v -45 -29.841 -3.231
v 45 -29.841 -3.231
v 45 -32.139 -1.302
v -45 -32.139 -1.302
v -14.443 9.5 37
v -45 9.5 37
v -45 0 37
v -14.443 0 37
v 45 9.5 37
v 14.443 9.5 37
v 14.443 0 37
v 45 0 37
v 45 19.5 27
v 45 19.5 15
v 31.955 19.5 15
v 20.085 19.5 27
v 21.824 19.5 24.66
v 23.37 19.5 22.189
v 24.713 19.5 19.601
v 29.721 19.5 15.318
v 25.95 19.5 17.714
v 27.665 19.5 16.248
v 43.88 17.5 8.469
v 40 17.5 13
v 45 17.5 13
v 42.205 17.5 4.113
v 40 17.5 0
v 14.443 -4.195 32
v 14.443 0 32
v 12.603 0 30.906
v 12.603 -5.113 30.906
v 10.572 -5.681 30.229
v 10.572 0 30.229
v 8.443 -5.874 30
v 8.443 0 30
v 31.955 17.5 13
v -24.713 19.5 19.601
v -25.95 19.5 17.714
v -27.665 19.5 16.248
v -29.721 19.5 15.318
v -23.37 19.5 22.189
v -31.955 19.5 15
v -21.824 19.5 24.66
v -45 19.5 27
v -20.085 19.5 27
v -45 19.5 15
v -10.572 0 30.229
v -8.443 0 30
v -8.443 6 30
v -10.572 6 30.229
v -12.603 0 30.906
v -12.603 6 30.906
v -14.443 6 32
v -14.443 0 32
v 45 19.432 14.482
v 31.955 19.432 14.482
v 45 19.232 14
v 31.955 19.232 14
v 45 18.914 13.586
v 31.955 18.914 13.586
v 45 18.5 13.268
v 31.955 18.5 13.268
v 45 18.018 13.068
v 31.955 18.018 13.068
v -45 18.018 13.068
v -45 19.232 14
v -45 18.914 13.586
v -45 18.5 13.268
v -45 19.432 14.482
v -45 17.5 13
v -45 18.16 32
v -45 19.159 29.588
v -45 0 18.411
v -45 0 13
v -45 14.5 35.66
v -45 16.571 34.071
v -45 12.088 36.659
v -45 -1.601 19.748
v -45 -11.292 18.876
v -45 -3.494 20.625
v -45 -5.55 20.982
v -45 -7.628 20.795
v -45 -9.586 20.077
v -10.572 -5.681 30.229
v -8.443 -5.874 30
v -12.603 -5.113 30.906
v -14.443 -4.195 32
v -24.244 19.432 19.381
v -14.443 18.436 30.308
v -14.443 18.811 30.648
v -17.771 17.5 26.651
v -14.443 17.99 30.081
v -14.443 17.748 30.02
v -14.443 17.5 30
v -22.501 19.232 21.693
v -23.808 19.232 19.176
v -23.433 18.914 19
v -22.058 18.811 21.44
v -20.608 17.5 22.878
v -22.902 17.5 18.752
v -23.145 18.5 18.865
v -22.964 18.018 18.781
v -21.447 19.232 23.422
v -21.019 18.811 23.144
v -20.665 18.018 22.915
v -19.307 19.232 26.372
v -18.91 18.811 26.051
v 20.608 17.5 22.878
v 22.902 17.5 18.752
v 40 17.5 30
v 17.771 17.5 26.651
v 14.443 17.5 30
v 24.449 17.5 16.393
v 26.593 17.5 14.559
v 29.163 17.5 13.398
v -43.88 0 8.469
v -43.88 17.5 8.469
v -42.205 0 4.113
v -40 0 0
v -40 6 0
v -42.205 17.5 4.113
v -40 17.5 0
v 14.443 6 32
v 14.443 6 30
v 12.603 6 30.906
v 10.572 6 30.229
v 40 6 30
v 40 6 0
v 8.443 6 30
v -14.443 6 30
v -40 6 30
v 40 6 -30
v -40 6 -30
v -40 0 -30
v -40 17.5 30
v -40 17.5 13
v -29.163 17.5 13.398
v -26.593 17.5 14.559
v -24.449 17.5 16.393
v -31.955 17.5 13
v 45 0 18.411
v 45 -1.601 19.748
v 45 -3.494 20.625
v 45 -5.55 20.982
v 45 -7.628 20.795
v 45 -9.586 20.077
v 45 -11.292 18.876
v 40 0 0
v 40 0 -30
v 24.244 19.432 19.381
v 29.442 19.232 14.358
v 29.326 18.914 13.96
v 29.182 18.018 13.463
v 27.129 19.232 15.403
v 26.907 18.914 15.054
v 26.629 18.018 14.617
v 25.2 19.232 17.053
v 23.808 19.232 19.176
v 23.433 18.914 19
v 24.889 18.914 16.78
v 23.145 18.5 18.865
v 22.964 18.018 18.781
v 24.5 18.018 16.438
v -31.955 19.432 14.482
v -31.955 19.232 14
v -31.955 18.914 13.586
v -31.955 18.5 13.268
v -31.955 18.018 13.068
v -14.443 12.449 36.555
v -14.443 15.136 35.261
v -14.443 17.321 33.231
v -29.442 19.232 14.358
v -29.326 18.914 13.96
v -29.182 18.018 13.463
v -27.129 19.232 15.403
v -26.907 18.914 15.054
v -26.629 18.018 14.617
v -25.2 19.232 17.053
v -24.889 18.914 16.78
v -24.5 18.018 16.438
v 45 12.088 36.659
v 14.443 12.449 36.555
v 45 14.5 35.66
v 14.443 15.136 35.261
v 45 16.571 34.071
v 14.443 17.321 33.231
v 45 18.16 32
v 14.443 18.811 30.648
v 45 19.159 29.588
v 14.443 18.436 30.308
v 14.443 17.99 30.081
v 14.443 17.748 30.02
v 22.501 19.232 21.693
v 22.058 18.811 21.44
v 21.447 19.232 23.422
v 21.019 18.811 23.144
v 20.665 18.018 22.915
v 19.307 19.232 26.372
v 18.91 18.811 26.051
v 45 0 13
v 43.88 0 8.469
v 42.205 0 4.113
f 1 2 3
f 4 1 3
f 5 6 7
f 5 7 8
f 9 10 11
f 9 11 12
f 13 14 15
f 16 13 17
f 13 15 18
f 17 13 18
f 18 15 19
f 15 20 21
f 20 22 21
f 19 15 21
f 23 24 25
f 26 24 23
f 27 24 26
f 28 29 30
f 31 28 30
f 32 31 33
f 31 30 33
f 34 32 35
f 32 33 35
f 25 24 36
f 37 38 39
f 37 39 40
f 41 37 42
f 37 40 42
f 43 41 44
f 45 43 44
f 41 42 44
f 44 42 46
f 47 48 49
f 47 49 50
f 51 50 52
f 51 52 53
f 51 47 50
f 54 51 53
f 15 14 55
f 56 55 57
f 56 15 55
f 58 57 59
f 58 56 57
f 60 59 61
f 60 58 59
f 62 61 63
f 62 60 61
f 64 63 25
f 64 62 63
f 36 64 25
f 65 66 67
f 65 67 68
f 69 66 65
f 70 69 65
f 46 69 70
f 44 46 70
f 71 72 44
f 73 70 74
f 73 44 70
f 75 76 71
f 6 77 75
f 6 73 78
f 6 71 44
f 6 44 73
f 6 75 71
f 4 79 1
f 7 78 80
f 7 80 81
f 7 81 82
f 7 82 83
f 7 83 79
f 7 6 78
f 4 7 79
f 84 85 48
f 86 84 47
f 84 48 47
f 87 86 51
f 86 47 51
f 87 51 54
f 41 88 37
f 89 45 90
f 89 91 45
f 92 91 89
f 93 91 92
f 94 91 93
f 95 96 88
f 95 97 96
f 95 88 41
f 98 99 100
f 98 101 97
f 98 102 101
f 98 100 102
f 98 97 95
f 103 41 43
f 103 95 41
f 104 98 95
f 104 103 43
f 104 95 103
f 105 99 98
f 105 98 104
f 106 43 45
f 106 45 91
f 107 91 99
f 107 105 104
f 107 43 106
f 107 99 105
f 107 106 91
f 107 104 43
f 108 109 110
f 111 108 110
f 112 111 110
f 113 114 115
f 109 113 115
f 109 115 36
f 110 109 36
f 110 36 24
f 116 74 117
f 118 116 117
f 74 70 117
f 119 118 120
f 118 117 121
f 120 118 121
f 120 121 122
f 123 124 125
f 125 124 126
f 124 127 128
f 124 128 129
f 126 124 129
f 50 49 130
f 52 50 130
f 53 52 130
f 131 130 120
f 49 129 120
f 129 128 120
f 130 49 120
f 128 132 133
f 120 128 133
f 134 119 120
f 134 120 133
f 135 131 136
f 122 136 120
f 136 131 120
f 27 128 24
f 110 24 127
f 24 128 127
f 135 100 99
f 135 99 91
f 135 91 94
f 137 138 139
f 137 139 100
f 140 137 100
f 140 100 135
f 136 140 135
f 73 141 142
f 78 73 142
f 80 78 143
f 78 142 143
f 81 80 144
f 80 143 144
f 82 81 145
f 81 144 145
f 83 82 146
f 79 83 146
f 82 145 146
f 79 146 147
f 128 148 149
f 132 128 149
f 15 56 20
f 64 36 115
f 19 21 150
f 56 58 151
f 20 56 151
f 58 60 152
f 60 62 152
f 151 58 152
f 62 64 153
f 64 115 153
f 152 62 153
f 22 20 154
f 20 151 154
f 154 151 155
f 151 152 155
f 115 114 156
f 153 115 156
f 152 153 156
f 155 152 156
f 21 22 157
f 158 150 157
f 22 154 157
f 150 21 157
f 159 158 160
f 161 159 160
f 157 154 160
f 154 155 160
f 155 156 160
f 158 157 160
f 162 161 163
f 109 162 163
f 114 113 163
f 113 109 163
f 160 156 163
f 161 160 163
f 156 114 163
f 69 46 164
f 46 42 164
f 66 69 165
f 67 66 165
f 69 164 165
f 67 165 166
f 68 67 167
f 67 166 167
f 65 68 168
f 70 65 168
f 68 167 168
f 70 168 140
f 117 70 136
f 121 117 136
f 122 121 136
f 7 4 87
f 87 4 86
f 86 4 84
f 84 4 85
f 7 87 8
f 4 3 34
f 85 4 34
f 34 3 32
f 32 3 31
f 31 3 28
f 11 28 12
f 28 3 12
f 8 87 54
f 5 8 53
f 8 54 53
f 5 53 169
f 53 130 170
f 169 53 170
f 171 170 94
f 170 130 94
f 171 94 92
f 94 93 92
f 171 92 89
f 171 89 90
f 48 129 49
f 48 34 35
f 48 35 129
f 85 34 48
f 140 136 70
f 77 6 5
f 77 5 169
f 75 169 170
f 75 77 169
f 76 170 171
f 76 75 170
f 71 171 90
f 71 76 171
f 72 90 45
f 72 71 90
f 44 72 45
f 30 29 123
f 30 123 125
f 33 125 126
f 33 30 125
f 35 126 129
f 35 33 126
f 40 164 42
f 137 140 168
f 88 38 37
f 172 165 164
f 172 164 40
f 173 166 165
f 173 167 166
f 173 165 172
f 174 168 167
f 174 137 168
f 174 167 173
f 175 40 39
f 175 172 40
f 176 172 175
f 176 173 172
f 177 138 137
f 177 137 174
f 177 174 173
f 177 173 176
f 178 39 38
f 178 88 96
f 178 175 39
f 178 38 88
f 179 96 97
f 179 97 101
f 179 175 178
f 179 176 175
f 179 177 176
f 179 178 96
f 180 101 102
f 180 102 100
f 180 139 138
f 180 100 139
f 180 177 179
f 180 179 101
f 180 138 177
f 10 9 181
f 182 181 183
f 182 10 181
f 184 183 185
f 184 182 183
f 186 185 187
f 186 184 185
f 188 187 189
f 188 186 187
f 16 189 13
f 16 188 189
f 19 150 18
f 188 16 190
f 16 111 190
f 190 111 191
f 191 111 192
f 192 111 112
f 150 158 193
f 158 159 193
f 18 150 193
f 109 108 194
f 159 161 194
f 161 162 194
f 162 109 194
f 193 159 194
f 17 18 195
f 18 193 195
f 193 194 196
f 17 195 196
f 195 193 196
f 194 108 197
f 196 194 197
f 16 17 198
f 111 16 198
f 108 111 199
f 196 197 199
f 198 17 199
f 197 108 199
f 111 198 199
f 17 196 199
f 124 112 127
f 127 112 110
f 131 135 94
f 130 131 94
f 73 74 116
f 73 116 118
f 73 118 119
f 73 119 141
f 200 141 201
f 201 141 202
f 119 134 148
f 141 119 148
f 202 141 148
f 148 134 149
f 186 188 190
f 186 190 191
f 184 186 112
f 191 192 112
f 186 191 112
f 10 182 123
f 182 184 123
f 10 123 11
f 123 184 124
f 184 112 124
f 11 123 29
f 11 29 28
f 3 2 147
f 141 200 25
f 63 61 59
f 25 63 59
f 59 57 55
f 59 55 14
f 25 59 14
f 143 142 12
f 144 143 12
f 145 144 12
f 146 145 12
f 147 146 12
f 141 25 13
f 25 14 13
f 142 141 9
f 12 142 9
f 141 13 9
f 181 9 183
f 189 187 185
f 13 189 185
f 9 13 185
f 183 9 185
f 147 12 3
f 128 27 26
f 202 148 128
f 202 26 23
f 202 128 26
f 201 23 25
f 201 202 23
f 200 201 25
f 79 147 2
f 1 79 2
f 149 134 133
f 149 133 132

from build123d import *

# Parameters (mm, degrees)
SKETCH1_W           = 80
SKETCH1_H           = 60
BOSS_EXTRUDE1_DEPTH = 6
SKETCH2_W           = 5
SKETCH2_H           = 17
BOSS_EXTRUDE2_DEPTH = 11.5
BOSS_EXTRUDE3_DEPTH = 6
BOSS_EXTRUDE4_START = 6
BOSS_EXTRUDE4_DEPTH = 6
BOSS_EXTRUDE5_DEPTH = 2
SKETCH6_W           = 30.556561627
SKETCH6_H           = 19.5
BOSS_EXTRUDE6_DEPTH = 2
FILLET1_R           = 10
FILLET2_R           = 2
BOSS_EXTRUDE7_DEPTH = 5
BOSS_EXTRUDE8_DEPTH = 5
FILLET3_START       = -45
FILLET3_DEPTH       = 90
BOSS_EXTRUDE9_REACH = 101.243
CUT_EXTRUDE1_DEPTH  = 67.535252268


with BuildPart() as part:
    # Sketch1 → Boss-Extrude1 (new body)
    with BuildSketch(Plane(origin=(0, 0, 0), x_dir=(1, 0, 0), z_dir=(0, 1, 0))):
        Rectangle(SKETCH1_W, SKETCH1_H)
    extrude(amount=BOSS_EXTRUDE1_DEPTH)



with BuildPart() as body_2:
    # Sketch2 → Boss-Extrude2 (new body)
    with BuildSketch(Plane(origin=(0, 6, 0), x_dir=(1, 0, 0), z_dir=(0, 1, 0))):
        with BuildLine():
            Line((-45, -13), (-40, -13))
            Line((-40, -13), (-40, 0))
            ThreePointArc((-40, 0), (-43.110841292, -6.265061041), (-45, -13))
        make_face()
        with Locations((-42.5, -21.5)):
            Rectangle(SKETCH2_W, SKETCH2_H)
        with BuildLine():
            Line((40, 0), (40, -13))
            Line((40, -13), (45, -13))
            ThreePointArc((45, -13), (43.110841292, -6.265061041), (40, 0))
        make_face()
        with Locations((42.5, -21.5)):
            Rectangle(SKETCH2_W, SKETCH2_H)
    extrude(amount=BOSS_EXTRUDE2_DEPTH)


with BuildPart() as part_1:
    add(part.part)

    add(body_2.part)  # Boss-Extrude3 merges body 2
    # Sketch3 → Boss-Extrude3 (add)
    with BuildSketch(Plane.XZ.offset(-6)):
        with BuildLine():
            Line((-40, 0), (-40, 30))
            Line((-40, 30), (-45, 30))
            Line((-45, 30), (-45, 13))
            ThreePointArc((-45, 13), (-43.110841292, 6.265061041), (-40, 0))
        make_face()
    extrude(amount=BOSS_EXTRUDE3_DEPTH)

    # Sketch4 → Boss-Extrude4 (add)
    with BuildSketch(Plane.XZ.offset(-6).offset(BOSS_EXTRUDE4_START)):
        with BuildLine():
            Line((40, 30), (40, 0))
            ThreePointArc((40, 0), (43.110841292, 6.265061041), (45, 13))
            Line((45, 13), (45, 30))
            Line((45, 30), (40, 30))
        make_face()
    extrude(amount=-BOSS_EXTRUDE4_DEPTH)

    # Sketch5 → Boss-Extrude5 (add)
    with BuildSketch(Plane(origin=(0, 17.5, 0), x_dir=(1, 0, 0), z_dir=(0, 1, 0))):
        with BuildLine():
            Line((-14.443438373, -30), (-25, -30))
            Line((-25, -30), (-45, -30))
            Line((-45, -30), (-45, -13))
            Line((-45, -13), (-31.955163637, -13))
            ThreePointArc((-31.955163637, -13), (-26.592535057, -14.559489665), (-22.902499246, -18.751557058))
            ThreePointArc((-22.902499246, -18.751557058), (-19.254329924, -24.812974066), (-14.443438373, -30))
        make_face()
        with BuildLine():
            Line((45, -30), (45, -13))
            Line((45, -13), (31.955163637, -13))
            ThreePointArc((31.955163637, -13), (26.592535057, -14.559489665), (22.902499246, -18.751557058))
            ThreePointArc((22.902499246, -18.751557058), (19.254329924, -24.812974066), (14.443438373, -30))
            Line((14.443438373, -30), (25, -30))
            Line((25, -30), (45, -30))
        make_face()
    extrude(amount=BOSS_EXTRUDE5_DEPTH)

    # Sketch6 → Boss-Extrude6 (add)
    with BuildSketch(Plane.XY.offset(30)):
        with Locations((-29.721719186, 9.75)):
            Rectangle(SKETCH6_W, SKETCH6_H)
        with Locations((29.721719186, 9.75)):
            Rectangle(SKETCH6_W, SKETCH6_H)
    extrude(amount=BOSS_EXTRUDE6_DEPTH)

    # Fillet1
    # the kernel refuses this fillet: 10 mm, written as the material it adds along each edge
    with BuildSketch(Plane(origin=(14.443438373, 0, 30), x_dir=(-1, 0, 0), z_dir=(0, 1, 0))) as fillet1_piece_1:
        with BuildLine():
            CenterArc((6, 10), FILLET1_R, 233.130102354, 36.869897646)
            Line((0, 2), (0, 0))
            Line((0, 0), (6, 0))
        make_face()
    extrude(amount=6)
    with BuildSketch(Plane(origin=(-14.443438373, 0, 30), x_dir=(1, 0, 0), z_dir=(0, 1, 0))) as fillet1_piece_2:
        with BuildLine():
            CenterArc((6, -10), FILLET1_R, 90, 36.869897646)
            Line((0, -2), (0, 0))
            Line((0, 0), (6, 0))
        make_face()
    extrude(amount=6)

    # Fillet2
    fillet2_edges = [part_1.edges().sort_by_distance(p)[0] for p in [
        (38.477581818, 19.5, 13),
        (19.254329924, 19.5, 24.812974066),
        (-19.254329924, 19.5, 24.812974066),
        (-26.592535057, 19.5, 14.559489665),
        (26.592535057, 19.5, 14.559489665),
        (-38.477581818, 19.5, 13),
    ]]
    fillet(fillet2_edges, radius=FILLET2_R - 0.0001)  # a hair under: the kernel refuses the full size

    # Sketch7 → Boss-Extrude7 (add)
    with BuildSketch(Plane.XY.offset(32)):
        with BuildLine():
            Line((45, 19.5), (15.184151192, 19.5))
            add(Edge.make_bspline(
                [(15.184151192, 19.5), (14.93580845, 19.5), (14.688907154, 19.481115197), (14.443438373, 19.443462601)],
                knots=[0, 0, 0, 0, 1, 1, 1, 1], degree=3))
            Line((14.443438373, 19.443462601), (14.443438373, 6))
            Line((14.443438373, 6), (14.443438373, 0))
            Line((14.443438373, 0), (45, 0))
            Line((45, 0), (45, 19.5))
        make_face()
    extrude(amount=BOSS_EXTRUDE7_DEPTH)

    # Sketch8 → Boss-Extrude8 (add)
    with BuildSketch(Plane.XY.offset(32)):
        with BuildLine():
            Line((-14.443438373, 6), (-14.443438373, 19.443462601))
            add(Edge.make_bspline(
                [(-14.443438373, 19.443462601), (-14.688907154, 19.481115197), (-14.93580845, 19.5), (-15.184151192, 19.5)],
                knots=[0, 0, 0, 0, 1, 1, 1, 1], degree=3))
            Line((-15.184151192, 19.5), (-45, 19.5))
            Line((-45, 19.5), (-45, 0))
            Line((-45, 0), (-14.443438373, 0))
            Line((-14.443438373, 0), (-14.443438373, 6))
        make_face()
    extrude(amount=BOSS_EXTRUDE8_DEPTH)

    # Fillet3: read off the stored shape, not the designer's step
    # Fillet3 outline → Fillet3 (cut)
    with BuildSketch(Plane.YZ.offset(FILLET3_START)):
        with BuildLine():
            Line((19.5, 37), (9.5, 37))
            ThreePointArc((9.5, 37), (16.571067812, 34.071067812), (19.5, 27))
            Line((19.5, 27), (19.5, 37))
        make_face()
    extrude(amount=FILLET3_DEPTH, mode=Mode.SUBTRACT)

    # Boss-Extrude9: up to this face of the body (flat: up to its plane)
    boss_extrude9_end = Plane(part_1.part.faces().sort_by_distance((-45, 9.370161856, 24.55198813))[0])
    # Sketch9 → Boss-Extrude9 (add, up to the picked face)
    with BuildSketch(Plane(origin=(45, 0, 0), x_dir=(0, 0, -1), z_dir=(1, 0, 0)), mode=Mode.PRIVATE) as boss_extrude9_sk1:
        with BuildLine():
            Line((-37, 0), (-18.411320002, 0))
            ThreePointArc((-18.411320002, 0), (-20.982100343, -5.549822615), (-18.87559935, -11.291956033))
            Line((-18.87559935, -11.291956033), (3.230584985, -29.841247155))
            Line((3.230584985, -29.841247155), (1.302222156, -32.139380484))
            Line((1.302222156, -32.139380484), (-37, 0))
        make_face()
    boss_extrude9_tool1 = split(extrude(boss_extrude9_sk1.sketch, amount=-BOSS_EXTRUDE9_REACH, mode=Mode.PRIVATE), bisect_by=boss_extrude9_end, keep=Keep.BOTH, mode=Mode.PRIVATE)
    add(boss_extrude9_tool1.solids().sort_by(Axis((45, -11.881572, 18.599139), (-1, 0, 0)))[0])

    # Sketch10 → Cut-Extrude1 (cut, through all)
    with BuildSketch(Plane(origin=(0, 0, 0), x_dir=(1, 0, 0), z_dir=(0, 1, 0))):
        with BuildLine():
            Line((-14.443438373, -37), (14.443438373, -37))
            Line((14.443438373, -37), (14.443438373, -32))
            ThreePointArc((14.443438373, -32), (11.605716034, -30.513167019), (8.443438373, -30))
            Line((8.443438373, -30), (-8.443438373, -30))
            ThreePointArc((-8.443438373, -30), (-11.605716034, -30.513167019), (-14.443438373, -32))
            Line((-14.443438373, -32), (-14.443438373, -37))
        make_face()
    extrude(amount=-CUT_EXTRUDE1_DEPTH, mode=Mode.SUBTRACT)


solid = part_1.part
